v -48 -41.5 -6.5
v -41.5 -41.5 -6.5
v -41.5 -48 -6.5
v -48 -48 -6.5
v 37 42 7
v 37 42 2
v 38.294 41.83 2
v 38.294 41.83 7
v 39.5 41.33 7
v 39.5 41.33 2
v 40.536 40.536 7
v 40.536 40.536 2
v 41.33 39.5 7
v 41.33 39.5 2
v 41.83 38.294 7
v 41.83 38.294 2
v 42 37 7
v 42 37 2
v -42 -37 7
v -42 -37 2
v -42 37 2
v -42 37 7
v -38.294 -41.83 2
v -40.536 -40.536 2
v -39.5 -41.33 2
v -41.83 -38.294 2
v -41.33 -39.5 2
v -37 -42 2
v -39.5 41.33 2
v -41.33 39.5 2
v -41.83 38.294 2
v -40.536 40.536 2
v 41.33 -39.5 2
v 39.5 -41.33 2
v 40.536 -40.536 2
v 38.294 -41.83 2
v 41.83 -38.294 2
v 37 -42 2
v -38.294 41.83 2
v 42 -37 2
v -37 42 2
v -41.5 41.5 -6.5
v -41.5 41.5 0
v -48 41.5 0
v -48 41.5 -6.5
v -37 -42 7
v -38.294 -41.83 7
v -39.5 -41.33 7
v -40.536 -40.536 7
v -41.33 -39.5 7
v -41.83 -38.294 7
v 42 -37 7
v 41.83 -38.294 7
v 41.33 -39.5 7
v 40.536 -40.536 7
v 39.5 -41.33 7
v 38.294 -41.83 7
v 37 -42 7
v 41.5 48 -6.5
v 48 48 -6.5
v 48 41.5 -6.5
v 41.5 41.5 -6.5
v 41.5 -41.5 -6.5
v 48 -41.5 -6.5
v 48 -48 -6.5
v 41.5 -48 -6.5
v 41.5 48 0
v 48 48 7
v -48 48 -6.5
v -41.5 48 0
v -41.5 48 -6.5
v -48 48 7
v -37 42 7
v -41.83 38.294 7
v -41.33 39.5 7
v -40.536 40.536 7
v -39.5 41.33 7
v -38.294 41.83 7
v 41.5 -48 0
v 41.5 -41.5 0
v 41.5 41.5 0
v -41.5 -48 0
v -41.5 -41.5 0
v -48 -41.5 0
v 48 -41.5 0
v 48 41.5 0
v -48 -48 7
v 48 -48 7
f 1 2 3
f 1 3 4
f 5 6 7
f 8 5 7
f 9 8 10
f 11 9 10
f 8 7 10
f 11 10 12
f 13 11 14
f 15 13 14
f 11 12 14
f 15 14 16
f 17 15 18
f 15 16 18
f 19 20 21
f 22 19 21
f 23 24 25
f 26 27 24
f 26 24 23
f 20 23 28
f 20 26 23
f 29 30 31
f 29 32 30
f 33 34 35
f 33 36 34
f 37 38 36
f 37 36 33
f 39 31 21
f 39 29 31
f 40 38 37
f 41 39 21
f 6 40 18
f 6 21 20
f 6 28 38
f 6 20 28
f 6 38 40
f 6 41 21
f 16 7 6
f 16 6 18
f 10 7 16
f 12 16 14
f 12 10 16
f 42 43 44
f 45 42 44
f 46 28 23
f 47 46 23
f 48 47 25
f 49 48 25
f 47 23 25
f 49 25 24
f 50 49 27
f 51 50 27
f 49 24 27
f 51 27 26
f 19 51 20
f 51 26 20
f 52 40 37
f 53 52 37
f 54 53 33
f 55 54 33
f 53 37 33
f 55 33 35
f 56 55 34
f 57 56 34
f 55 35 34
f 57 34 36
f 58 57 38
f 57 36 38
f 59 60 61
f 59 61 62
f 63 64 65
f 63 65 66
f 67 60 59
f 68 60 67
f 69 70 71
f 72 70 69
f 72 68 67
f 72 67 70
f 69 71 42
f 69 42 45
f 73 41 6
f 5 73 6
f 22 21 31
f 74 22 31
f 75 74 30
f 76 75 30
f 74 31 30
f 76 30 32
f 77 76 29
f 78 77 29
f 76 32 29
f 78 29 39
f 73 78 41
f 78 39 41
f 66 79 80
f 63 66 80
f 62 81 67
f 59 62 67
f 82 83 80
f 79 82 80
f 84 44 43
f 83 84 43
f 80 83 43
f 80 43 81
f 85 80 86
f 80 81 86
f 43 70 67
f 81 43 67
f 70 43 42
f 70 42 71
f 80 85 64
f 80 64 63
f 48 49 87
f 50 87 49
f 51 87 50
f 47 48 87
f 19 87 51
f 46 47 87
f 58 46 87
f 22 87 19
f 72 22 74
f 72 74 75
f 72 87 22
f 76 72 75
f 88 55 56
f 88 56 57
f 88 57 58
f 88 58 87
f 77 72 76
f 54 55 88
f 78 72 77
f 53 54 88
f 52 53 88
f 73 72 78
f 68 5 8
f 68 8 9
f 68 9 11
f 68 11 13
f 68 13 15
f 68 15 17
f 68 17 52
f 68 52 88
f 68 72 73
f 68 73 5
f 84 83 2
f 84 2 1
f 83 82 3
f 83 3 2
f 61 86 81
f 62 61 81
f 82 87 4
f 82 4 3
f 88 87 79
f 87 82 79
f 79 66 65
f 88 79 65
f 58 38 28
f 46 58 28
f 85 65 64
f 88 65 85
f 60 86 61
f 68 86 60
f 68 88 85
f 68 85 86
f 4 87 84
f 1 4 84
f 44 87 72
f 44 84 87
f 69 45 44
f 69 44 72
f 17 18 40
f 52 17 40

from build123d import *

# Parameters (mm, degrees)
SKETCH1_W           = 96
SKETCH1_H           = 96
BOSS_EXTRUDE1_DEPTH = 2
SKETCH2_W           = 96
SKETCH2_H           = 96
BOSS_EXTRUDE2_DEPTH = 5
SKETCH3_W           = 6.5
SKETCH3_H           = 6.5
BOSS_EXTRUDE3_DEPTH = 6.5


with BuildPart() as part:
    # Sketch1 → Boss-Extrude1 (new body)
    with BuildSketch(Plane.XY):
        Rectangle(SKETCH1_W, SKETCH1_H)
    extrude(amount=BOSS_EXTRUDE1_DEPTH)

    # Sketch2 → Boss-Extrude2 (add)
    with BuildSketch(Plane.XY.offset(2)):
        Rectangle(SKETCH2_W, SKETCH2_H)
        with BuildLine():
            Line((37, -42), (-37, -42))
            ThreePointArc((-37, -42), (-40.535533906, -40.535533906), (-42, -37))
            Line((-42, -37), (-42, 37))
            ThreePointArc((-42, 37), (-40.535533906, 40.535533906), (-37, 42))
            Line((-37, 42), (37, 42))
            ThreePointArc((37, 42), (40.535533906, 40.535533906), (42, 37))
            Line((42, 37), (42, -37))
            ThreePointArc((42, -37), (40.535533906, -40.535533906), (37, -42))
        make_face(mode=Mode.SUBTRACT)
    extrude(amount=BOSS_EXTRUDE2_DEPTH)

    # Sketch3 → Boss-Extrude3 (add)
    with BuildSketch(Plane(origin=(0, 0, 0), x_dir=(-1, 0, 0), z_dir=(0, 0, -1))):
        with Locations((-44.75, 44.75)):
            Rectangle(SKETCH3_W, SKETCH3_H)
        with Locations((44.75, 44.75)):
            Rectangle(SKETCH3_W, SKETCH3_H)
        with Locations((-44.75, -44.75)):
            Rectangle(SKETCH3_W, SKETCH3_H)
        with Locations((44.75, -44.75)):
            Rectangle(SKETCH3_W, SKETCH3_H)
    extrude(amount=BOSS_EXTRUDE3_DEPTH)


solid = part.part
